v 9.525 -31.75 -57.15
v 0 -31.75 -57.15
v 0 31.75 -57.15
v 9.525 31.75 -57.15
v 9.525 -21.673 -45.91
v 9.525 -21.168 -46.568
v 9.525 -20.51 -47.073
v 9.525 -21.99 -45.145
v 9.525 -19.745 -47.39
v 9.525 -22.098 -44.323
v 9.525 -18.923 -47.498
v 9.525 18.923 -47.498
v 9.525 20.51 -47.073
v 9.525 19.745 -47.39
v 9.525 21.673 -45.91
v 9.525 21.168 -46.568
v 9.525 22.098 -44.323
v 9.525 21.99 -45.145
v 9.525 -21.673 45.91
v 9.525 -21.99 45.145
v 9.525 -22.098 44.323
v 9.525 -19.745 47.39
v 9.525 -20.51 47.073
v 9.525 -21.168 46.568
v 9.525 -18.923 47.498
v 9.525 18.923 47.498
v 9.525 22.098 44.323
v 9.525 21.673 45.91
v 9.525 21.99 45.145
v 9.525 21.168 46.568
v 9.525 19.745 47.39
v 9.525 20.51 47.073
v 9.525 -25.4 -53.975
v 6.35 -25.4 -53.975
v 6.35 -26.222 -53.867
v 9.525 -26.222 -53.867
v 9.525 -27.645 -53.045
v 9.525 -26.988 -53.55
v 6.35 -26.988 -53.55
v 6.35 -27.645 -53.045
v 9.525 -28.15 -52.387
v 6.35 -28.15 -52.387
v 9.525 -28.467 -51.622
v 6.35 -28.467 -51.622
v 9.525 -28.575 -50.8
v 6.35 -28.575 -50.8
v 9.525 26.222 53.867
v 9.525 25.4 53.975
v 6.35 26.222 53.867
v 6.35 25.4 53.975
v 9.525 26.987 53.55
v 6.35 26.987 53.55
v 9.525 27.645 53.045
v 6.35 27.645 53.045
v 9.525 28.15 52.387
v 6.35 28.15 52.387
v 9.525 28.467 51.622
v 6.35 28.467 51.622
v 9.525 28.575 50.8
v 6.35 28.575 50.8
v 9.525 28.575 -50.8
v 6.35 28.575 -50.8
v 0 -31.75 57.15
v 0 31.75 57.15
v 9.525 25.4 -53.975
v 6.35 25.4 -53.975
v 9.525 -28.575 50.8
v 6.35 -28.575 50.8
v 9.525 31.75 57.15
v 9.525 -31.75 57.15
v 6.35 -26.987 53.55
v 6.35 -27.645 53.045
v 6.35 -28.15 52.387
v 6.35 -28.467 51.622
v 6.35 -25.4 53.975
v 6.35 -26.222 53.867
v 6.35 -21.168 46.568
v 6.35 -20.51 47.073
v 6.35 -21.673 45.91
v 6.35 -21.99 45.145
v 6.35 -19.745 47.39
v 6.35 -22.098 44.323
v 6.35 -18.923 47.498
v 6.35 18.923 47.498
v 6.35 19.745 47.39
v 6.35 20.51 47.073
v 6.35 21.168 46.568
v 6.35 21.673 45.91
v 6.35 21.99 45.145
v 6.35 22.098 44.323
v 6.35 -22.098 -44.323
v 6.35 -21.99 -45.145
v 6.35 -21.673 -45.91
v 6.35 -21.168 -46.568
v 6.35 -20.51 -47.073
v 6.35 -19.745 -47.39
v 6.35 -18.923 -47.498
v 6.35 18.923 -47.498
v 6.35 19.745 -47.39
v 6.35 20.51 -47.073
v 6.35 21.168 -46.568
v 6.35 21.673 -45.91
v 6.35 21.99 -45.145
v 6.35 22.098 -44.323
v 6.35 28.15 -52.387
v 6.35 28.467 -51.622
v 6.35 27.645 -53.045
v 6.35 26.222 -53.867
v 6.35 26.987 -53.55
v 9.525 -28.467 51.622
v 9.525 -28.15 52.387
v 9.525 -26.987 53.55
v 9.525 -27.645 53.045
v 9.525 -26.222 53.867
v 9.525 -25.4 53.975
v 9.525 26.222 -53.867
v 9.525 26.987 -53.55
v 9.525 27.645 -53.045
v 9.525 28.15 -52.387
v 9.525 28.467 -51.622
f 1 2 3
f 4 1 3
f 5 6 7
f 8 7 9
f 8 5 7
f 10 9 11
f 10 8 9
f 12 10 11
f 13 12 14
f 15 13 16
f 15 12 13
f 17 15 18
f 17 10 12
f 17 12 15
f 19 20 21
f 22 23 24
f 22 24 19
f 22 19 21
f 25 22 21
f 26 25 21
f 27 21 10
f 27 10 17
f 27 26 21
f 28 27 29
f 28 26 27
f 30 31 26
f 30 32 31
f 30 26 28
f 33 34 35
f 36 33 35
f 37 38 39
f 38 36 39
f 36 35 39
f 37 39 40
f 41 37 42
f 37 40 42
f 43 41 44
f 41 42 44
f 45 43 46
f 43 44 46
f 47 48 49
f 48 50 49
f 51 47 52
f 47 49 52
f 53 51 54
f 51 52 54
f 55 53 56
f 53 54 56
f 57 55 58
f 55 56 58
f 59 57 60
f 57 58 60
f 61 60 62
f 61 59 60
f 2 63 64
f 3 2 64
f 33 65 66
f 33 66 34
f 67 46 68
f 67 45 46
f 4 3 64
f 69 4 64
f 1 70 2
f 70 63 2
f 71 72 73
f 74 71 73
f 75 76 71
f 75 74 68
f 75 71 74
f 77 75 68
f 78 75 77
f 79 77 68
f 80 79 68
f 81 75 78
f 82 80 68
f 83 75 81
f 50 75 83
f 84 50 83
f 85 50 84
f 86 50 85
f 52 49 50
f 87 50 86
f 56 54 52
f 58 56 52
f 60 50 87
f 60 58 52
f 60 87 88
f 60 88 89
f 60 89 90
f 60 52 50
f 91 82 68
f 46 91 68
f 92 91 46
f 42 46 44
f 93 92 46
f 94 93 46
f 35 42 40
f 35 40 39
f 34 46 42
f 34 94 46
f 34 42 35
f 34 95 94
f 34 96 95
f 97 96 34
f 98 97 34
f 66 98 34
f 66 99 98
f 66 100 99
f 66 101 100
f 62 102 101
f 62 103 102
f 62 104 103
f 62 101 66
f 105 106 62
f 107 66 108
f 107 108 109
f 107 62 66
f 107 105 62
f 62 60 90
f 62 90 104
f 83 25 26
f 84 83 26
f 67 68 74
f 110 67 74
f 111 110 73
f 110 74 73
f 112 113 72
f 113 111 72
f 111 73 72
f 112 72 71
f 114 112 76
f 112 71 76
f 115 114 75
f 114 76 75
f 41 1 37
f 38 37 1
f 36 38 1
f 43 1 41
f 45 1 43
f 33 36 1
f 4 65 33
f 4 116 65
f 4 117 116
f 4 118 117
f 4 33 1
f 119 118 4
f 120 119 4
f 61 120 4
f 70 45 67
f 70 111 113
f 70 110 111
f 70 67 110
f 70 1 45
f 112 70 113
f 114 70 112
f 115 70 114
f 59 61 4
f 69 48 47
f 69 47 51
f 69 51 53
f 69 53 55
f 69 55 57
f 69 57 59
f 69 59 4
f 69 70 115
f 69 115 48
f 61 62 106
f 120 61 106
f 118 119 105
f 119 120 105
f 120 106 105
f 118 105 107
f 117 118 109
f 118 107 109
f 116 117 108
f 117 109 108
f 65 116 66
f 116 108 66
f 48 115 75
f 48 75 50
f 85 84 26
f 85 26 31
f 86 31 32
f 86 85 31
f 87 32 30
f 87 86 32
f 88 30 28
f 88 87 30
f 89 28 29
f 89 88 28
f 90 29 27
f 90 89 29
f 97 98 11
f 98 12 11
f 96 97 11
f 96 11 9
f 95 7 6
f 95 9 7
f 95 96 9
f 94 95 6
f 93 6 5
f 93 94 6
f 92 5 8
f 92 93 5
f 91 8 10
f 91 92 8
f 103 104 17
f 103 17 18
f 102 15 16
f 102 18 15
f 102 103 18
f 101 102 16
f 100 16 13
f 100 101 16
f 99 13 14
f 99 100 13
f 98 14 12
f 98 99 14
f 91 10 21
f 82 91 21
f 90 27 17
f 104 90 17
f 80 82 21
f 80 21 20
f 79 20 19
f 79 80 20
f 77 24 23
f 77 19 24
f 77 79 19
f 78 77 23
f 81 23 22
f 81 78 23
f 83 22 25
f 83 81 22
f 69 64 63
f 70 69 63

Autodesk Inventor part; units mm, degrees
ref_plane "YZ Plane" through (0, 0, 0) normal (1, 0, 0) x (0, 1, 0)
ref_plane "XZ Plane" through (0, 0, 0) normal (0, 1, 0) x (-1, 0, 0)
ref_plane "XY Plane" through (0, 0, 0) normal (0, 0, 1) x (1, 0, 0)
sketch "Sketch1" plane through (0, 0, 0) normal (1, 0, 0) x (0, 1, 0)
  line L0 (31.75, 57.15) -> (-31.75, 57.15)
  line L1 (-31.75, 57.15) -> (-31.75, -57.15)
  line L2 (-31.75, -57.15) -> (31.75, -57.15)
  line L3 (31.75, -57.15) -> (31.75, 57.15)
  point P0 (0, 0)
  point P1 (31.75, 0)
  point P2 (0, 57.15)
  dimension "d0" = 114.3
  dimension "d1" = 63.5
extrude "Extrusion1" add sketch "Sketch1" along normal blind 9.525
sketch "Sketch3" plane through (9.525, 0, 0) normal (1, 0, 0) x (0, 0, -1)
  line L0 (-53.975, 28.575) -> (53.975, 28.575)
  line L1 (53.975, 28.575) -> (53.975, -28.575)
  line L2 (53.975, -28.575) -> (-53.975, -28.575)
  line L3 (-53.975, -28.575) -> (-53.975, 28.575)
  line L4 (-47.498, 22.098) -> (47.498, 22.098)
  line L5 (47.498, 22.098) -> (47.498, -22.098)
  line L6 (47.498, -22.098) -> (-47.498, -22.098)
  line L7 (-47.498, -22.098) -> (-47.498, 22.098)
  point P0 (0, 0)
  point P1 (0, 0)
  point P2 (-53.975, 0)
  point P3 (0, 28.575)
  dimension "d8" = 57.15
  dimension "d9" = 107.95
  dimension "d14" = 6.477
extrude "Extrusion3" cut sketch "Sketch3" against normal blind 3.175
fillet "Fillet1" radius 3.175 8 edges at (7.9375, 28.575, 53.975) (7.9375, -28.575, 53.975) (7.9375, -28.575, -53.975) (7.9375, 28.575, -53.975) (7.9375, -22.098, -47.498) (7.9375, 22.098, -47.498) (7.9375, 22.098, 47.498) (7.9375, -22.098, 47.498)
properties part number "plateEnd" material "Aluminum 6061"
